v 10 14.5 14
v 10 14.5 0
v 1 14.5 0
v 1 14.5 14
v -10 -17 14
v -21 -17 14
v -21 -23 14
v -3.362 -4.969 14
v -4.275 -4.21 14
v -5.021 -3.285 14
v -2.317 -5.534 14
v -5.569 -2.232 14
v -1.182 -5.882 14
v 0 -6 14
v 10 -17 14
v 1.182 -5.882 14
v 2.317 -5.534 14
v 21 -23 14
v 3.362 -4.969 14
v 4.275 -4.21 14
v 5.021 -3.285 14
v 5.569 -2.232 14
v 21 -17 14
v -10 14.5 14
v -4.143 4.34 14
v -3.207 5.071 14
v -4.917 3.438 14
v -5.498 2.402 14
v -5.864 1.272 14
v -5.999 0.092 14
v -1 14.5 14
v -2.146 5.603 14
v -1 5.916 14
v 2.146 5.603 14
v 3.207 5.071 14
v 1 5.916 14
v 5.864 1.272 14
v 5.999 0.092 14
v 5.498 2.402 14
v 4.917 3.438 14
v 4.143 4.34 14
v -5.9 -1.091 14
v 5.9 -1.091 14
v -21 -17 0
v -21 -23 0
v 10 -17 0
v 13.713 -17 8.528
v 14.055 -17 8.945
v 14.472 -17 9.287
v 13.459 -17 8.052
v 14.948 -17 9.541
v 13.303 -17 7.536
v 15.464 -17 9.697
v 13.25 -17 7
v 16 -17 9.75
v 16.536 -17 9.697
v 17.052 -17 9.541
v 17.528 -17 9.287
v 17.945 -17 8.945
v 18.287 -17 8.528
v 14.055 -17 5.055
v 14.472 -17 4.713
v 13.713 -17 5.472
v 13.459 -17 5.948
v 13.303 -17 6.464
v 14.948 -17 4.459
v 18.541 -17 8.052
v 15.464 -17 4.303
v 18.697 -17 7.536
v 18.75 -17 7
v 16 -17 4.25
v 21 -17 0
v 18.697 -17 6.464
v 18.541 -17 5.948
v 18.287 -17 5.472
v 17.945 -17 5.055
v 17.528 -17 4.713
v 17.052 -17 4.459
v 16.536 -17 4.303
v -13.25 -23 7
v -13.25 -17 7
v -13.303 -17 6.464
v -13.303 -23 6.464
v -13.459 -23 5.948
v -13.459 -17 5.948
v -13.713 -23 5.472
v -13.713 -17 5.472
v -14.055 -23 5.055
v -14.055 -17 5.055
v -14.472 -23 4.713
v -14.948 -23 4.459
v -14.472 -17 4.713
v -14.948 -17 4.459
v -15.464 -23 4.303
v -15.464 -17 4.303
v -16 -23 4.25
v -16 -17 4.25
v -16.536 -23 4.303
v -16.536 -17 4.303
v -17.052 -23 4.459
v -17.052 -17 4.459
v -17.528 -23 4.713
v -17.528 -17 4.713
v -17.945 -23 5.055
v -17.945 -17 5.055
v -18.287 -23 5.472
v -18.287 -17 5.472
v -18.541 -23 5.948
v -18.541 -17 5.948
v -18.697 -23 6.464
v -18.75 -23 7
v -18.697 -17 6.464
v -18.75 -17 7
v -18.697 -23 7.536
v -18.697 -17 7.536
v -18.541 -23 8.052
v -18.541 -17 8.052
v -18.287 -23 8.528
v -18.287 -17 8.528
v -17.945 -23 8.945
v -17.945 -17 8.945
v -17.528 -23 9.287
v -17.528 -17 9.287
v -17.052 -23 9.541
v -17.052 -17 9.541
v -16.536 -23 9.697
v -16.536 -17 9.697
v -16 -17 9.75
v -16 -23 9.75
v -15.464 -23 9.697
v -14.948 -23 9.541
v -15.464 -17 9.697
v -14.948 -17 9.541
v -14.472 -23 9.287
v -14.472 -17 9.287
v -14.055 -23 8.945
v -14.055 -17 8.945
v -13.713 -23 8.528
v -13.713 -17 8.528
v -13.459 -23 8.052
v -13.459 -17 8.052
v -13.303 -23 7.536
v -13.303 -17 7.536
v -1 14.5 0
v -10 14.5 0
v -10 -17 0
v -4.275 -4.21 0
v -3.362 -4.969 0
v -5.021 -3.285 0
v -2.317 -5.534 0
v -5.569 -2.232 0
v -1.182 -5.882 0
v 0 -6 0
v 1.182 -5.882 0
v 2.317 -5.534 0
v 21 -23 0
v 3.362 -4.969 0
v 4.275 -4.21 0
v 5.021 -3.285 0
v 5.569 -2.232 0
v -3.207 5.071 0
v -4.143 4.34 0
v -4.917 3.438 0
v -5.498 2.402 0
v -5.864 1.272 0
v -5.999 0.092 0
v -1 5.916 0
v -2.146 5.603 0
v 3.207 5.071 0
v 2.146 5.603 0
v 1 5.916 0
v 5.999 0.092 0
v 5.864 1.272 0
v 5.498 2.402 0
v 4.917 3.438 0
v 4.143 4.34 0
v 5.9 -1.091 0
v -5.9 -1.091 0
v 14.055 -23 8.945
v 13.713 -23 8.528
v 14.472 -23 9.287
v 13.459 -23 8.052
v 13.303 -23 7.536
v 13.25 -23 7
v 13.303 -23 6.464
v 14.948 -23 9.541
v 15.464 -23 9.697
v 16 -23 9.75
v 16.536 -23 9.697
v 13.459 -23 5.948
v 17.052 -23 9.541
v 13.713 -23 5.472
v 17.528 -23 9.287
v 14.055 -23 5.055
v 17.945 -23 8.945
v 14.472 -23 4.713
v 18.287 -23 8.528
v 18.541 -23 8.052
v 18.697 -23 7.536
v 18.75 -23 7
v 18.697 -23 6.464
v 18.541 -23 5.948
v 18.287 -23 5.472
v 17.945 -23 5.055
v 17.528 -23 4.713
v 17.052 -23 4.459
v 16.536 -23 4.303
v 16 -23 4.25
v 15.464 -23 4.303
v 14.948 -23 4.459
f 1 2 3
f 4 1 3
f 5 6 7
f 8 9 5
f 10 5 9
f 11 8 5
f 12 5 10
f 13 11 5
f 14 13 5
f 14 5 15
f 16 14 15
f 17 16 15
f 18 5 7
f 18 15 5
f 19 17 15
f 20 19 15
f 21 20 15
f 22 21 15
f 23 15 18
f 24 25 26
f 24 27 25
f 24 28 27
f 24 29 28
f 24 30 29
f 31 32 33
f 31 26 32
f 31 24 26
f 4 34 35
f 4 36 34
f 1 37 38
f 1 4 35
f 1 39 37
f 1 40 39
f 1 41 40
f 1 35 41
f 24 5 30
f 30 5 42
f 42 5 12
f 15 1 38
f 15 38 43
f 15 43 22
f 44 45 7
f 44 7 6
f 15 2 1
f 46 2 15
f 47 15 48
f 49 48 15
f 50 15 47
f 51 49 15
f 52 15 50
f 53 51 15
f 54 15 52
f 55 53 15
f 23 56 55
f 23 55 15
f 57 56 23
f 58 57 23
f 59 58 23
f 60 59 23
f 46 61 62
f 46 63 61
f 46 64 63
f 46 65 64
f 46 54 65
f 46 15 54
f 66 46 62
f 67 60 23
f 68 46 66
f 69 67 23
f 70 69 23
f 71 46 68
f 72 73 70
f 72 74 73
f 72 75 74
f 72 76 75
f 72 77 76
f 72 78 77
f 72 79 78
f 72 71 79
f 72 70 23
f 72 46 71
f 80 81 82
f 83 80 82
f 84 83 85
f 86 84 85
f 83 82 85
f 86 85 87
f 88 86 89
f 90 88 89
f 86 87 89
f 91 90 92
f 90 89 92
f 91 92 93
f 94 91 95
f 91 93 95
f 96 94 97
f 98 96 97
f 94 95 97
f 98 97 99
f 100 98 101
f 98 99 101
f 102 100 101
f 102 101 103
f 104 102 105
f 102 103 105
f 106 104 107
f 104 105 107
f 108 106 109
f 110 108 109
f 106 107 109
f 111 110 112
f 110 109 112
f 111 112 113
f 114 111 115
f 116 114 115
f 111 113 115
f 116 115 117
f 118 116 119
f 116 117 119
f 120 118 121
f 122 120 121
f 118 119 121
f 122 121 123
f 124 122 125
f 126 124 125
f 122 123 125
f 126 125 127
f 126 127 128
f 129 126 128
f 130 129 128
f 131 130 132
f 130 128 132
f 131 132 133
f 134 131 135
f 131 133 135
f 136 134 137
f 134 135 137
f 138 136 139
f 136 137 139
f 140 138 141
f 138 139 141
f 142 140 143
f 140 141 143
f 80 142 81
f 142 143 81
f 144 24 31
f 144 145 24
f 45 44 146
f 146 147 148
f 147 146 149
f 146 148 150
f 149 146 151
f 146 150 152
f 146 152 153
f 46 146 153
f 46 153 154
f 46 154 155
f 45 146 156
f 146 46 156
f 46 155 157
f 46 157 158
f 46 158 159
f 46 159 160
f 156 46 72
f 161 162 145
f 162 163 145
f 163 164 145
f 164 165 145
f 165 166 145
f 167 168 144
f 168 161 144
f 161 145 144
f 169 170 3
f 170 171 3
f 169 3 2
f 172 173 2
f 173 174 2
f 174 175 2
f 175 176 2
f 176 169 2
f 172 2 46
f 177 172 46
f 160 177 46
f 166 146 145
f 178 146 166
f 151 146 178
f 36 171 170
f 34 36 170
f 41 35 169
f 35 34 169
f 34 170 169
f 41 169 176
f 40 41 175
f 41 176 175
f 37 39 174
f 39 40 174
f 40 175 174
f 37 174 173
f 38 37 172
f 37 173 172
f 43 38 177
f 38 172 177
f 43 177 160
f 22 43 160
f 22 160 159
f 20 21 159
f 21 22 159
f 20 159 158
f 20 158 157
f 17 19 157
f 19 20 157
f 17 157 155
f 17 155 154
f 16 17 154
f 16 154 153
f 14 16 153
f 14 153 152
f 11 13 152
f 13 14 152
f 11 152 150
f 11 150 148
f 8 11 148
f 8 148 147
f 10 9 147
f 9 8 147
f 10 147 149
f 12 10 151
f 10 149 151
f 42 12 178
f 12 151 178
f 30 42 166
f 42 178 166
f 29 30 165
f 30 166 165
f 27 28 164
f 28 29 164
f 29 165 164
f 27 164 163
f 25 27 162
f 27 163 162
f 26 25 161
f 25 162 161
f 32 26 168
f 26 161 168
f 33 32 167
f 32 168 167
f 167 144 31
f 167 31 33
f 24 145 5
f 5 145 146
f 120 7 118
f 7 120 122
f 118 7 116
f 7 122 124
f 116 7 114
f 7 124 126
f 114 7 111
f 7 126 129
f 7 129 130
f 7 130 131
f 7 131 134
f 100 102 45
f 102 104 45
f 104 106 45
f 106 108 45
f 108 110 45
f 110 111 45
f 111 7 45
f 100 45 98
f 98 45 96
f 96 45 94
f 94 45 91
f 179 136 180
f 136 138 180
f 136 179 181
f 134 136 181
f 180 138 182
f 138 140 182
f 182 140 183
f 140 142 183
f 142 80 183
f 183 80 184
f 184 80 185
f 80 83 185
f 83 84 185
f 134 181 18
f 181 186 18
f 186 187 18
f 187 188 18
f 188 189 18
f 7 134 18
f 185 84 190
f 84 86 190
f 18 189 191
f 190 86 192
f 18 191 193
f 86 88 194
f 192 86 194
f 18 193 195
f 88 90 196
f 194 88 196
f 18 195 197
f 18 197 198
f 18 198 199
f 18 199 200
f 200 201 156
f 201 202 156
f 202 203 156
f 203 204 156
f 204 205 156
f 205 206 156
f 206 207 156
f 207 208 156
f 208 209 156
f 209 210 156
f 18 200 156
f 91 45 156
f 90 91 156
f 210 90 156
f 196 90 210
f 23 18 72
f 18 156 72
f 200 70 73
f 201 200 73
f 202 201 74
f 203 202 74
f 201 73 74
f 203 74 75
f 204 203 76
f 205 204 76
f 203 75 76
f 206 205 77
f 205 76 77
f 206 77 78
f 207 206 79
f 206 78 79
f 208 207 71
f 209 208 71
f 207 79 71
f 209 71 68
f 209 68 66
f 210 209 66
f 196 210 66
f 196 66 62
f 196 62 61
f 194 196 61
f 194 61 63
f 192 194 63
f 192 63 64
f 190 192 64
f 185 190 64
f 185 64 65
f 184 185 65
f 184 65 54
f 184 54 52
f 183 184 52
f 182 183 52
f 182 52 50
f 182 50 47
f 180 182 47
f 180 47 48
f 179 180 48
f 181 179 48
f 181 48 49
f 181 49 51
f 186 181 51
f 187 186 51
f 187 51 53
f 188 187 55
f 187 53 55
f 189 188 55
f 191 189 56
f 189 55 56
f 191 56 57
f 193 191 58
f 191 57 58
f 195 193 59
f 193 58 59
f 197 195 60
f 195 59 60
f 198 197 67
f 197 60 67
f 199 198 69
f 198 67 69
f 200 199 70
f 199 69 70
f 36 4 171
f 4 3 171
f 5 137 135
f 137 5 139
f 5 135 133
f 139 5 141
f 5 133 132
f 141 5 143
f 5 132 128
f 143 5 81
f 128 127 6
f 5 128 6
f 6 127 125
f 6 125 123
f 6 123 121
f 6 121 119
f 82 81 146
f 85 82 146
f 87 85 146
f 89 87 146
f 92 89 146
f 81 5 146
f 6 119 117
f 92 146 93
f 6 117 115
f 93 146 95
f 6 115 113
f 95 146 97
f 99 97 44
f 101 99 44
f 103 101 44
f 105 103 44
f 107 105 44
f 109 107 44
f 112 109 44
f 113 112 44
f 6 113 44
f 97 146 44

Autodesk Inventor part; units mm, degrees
ref_plane "YZ Plane" through (0, 0, 0) normal (1, 0, 0) x (0, 1, 0)
ref_plane "XZ Plane" through (0, 0, 0) normal (0, 1, 0) x (-1, 0, 0)
ref_plane "XY Plane" through (0, 0, 0) normal (0, 0, 1) x (1, 0, 0)
sketch "Sketch1" plane through (0, 0, 0) normal (0, 0, 1) x (1, 0, 0)
  arc A0 (-1, 5.9161) -> (1, 5.9161) centre (0, 0) ccw
  line L0 (-21, -23) -> (21, -23)
  line L1 (-21, -23) -> (-21, -17)
  line L2 (21, -23) -> (21, -17)
  line L3 (-10, 14.5) -> (-10, -17)
  line L4 (-10, -17) -> (-21, -17)
  line L5 (-10, 14.5) -> (-1, 14.5)
  line L6 (10, 14.5) -> (1, 14.5)
  line L7 (1, 14.5) -> (1, 5.9161)
  line L8 (-1, 14.5) -> (-1, 5.9161)
  line L9 (10, 14.5) -> (10, -17)
  line L10 (10, -17) -> (21, -17)
  dimension "d0" = 12
  dimension "d1" = 23
  dimension "d2" = 42
  dimension "d3" = 21
  dimension "d4" = 6
  dimension "d7" = 9
  dimension "d8" = 9
  dimension "d10" = 37.5
  dimension "d11" = 37.5
  dimension "d14" = 10
  dimension "d15" = 31.5
  dimension "d16" = 6
  dimension "d17" = 10
extrude "Extrusion1" add sketch "Sketch1" along normal blind 14
sketch "Sketch2" plane through (10, -17, 0) normal (0, 1, 0) x (1, 0, 0)
  circle A0 centre (-26, -7) radius 2.75
  circle A1 centre (6, -7) radius 2.75
  line L0 (-10, 2.8) -> (-10, -16.8) projected
  line L1 (-20, -14) -> (-31, -14) projected
  point P0 (-10, 0)
  dimension "d20" = 5.5
  dimension "d21" = 5.5
  dimension "d22" = 32
  dimension "d23" = 16
  dimension "d24" = 7
  dimension "d25" = 16
extrude "Extrusion2" cut sketch "Sketch2" against normal blind 14
properties part number "SK12"
